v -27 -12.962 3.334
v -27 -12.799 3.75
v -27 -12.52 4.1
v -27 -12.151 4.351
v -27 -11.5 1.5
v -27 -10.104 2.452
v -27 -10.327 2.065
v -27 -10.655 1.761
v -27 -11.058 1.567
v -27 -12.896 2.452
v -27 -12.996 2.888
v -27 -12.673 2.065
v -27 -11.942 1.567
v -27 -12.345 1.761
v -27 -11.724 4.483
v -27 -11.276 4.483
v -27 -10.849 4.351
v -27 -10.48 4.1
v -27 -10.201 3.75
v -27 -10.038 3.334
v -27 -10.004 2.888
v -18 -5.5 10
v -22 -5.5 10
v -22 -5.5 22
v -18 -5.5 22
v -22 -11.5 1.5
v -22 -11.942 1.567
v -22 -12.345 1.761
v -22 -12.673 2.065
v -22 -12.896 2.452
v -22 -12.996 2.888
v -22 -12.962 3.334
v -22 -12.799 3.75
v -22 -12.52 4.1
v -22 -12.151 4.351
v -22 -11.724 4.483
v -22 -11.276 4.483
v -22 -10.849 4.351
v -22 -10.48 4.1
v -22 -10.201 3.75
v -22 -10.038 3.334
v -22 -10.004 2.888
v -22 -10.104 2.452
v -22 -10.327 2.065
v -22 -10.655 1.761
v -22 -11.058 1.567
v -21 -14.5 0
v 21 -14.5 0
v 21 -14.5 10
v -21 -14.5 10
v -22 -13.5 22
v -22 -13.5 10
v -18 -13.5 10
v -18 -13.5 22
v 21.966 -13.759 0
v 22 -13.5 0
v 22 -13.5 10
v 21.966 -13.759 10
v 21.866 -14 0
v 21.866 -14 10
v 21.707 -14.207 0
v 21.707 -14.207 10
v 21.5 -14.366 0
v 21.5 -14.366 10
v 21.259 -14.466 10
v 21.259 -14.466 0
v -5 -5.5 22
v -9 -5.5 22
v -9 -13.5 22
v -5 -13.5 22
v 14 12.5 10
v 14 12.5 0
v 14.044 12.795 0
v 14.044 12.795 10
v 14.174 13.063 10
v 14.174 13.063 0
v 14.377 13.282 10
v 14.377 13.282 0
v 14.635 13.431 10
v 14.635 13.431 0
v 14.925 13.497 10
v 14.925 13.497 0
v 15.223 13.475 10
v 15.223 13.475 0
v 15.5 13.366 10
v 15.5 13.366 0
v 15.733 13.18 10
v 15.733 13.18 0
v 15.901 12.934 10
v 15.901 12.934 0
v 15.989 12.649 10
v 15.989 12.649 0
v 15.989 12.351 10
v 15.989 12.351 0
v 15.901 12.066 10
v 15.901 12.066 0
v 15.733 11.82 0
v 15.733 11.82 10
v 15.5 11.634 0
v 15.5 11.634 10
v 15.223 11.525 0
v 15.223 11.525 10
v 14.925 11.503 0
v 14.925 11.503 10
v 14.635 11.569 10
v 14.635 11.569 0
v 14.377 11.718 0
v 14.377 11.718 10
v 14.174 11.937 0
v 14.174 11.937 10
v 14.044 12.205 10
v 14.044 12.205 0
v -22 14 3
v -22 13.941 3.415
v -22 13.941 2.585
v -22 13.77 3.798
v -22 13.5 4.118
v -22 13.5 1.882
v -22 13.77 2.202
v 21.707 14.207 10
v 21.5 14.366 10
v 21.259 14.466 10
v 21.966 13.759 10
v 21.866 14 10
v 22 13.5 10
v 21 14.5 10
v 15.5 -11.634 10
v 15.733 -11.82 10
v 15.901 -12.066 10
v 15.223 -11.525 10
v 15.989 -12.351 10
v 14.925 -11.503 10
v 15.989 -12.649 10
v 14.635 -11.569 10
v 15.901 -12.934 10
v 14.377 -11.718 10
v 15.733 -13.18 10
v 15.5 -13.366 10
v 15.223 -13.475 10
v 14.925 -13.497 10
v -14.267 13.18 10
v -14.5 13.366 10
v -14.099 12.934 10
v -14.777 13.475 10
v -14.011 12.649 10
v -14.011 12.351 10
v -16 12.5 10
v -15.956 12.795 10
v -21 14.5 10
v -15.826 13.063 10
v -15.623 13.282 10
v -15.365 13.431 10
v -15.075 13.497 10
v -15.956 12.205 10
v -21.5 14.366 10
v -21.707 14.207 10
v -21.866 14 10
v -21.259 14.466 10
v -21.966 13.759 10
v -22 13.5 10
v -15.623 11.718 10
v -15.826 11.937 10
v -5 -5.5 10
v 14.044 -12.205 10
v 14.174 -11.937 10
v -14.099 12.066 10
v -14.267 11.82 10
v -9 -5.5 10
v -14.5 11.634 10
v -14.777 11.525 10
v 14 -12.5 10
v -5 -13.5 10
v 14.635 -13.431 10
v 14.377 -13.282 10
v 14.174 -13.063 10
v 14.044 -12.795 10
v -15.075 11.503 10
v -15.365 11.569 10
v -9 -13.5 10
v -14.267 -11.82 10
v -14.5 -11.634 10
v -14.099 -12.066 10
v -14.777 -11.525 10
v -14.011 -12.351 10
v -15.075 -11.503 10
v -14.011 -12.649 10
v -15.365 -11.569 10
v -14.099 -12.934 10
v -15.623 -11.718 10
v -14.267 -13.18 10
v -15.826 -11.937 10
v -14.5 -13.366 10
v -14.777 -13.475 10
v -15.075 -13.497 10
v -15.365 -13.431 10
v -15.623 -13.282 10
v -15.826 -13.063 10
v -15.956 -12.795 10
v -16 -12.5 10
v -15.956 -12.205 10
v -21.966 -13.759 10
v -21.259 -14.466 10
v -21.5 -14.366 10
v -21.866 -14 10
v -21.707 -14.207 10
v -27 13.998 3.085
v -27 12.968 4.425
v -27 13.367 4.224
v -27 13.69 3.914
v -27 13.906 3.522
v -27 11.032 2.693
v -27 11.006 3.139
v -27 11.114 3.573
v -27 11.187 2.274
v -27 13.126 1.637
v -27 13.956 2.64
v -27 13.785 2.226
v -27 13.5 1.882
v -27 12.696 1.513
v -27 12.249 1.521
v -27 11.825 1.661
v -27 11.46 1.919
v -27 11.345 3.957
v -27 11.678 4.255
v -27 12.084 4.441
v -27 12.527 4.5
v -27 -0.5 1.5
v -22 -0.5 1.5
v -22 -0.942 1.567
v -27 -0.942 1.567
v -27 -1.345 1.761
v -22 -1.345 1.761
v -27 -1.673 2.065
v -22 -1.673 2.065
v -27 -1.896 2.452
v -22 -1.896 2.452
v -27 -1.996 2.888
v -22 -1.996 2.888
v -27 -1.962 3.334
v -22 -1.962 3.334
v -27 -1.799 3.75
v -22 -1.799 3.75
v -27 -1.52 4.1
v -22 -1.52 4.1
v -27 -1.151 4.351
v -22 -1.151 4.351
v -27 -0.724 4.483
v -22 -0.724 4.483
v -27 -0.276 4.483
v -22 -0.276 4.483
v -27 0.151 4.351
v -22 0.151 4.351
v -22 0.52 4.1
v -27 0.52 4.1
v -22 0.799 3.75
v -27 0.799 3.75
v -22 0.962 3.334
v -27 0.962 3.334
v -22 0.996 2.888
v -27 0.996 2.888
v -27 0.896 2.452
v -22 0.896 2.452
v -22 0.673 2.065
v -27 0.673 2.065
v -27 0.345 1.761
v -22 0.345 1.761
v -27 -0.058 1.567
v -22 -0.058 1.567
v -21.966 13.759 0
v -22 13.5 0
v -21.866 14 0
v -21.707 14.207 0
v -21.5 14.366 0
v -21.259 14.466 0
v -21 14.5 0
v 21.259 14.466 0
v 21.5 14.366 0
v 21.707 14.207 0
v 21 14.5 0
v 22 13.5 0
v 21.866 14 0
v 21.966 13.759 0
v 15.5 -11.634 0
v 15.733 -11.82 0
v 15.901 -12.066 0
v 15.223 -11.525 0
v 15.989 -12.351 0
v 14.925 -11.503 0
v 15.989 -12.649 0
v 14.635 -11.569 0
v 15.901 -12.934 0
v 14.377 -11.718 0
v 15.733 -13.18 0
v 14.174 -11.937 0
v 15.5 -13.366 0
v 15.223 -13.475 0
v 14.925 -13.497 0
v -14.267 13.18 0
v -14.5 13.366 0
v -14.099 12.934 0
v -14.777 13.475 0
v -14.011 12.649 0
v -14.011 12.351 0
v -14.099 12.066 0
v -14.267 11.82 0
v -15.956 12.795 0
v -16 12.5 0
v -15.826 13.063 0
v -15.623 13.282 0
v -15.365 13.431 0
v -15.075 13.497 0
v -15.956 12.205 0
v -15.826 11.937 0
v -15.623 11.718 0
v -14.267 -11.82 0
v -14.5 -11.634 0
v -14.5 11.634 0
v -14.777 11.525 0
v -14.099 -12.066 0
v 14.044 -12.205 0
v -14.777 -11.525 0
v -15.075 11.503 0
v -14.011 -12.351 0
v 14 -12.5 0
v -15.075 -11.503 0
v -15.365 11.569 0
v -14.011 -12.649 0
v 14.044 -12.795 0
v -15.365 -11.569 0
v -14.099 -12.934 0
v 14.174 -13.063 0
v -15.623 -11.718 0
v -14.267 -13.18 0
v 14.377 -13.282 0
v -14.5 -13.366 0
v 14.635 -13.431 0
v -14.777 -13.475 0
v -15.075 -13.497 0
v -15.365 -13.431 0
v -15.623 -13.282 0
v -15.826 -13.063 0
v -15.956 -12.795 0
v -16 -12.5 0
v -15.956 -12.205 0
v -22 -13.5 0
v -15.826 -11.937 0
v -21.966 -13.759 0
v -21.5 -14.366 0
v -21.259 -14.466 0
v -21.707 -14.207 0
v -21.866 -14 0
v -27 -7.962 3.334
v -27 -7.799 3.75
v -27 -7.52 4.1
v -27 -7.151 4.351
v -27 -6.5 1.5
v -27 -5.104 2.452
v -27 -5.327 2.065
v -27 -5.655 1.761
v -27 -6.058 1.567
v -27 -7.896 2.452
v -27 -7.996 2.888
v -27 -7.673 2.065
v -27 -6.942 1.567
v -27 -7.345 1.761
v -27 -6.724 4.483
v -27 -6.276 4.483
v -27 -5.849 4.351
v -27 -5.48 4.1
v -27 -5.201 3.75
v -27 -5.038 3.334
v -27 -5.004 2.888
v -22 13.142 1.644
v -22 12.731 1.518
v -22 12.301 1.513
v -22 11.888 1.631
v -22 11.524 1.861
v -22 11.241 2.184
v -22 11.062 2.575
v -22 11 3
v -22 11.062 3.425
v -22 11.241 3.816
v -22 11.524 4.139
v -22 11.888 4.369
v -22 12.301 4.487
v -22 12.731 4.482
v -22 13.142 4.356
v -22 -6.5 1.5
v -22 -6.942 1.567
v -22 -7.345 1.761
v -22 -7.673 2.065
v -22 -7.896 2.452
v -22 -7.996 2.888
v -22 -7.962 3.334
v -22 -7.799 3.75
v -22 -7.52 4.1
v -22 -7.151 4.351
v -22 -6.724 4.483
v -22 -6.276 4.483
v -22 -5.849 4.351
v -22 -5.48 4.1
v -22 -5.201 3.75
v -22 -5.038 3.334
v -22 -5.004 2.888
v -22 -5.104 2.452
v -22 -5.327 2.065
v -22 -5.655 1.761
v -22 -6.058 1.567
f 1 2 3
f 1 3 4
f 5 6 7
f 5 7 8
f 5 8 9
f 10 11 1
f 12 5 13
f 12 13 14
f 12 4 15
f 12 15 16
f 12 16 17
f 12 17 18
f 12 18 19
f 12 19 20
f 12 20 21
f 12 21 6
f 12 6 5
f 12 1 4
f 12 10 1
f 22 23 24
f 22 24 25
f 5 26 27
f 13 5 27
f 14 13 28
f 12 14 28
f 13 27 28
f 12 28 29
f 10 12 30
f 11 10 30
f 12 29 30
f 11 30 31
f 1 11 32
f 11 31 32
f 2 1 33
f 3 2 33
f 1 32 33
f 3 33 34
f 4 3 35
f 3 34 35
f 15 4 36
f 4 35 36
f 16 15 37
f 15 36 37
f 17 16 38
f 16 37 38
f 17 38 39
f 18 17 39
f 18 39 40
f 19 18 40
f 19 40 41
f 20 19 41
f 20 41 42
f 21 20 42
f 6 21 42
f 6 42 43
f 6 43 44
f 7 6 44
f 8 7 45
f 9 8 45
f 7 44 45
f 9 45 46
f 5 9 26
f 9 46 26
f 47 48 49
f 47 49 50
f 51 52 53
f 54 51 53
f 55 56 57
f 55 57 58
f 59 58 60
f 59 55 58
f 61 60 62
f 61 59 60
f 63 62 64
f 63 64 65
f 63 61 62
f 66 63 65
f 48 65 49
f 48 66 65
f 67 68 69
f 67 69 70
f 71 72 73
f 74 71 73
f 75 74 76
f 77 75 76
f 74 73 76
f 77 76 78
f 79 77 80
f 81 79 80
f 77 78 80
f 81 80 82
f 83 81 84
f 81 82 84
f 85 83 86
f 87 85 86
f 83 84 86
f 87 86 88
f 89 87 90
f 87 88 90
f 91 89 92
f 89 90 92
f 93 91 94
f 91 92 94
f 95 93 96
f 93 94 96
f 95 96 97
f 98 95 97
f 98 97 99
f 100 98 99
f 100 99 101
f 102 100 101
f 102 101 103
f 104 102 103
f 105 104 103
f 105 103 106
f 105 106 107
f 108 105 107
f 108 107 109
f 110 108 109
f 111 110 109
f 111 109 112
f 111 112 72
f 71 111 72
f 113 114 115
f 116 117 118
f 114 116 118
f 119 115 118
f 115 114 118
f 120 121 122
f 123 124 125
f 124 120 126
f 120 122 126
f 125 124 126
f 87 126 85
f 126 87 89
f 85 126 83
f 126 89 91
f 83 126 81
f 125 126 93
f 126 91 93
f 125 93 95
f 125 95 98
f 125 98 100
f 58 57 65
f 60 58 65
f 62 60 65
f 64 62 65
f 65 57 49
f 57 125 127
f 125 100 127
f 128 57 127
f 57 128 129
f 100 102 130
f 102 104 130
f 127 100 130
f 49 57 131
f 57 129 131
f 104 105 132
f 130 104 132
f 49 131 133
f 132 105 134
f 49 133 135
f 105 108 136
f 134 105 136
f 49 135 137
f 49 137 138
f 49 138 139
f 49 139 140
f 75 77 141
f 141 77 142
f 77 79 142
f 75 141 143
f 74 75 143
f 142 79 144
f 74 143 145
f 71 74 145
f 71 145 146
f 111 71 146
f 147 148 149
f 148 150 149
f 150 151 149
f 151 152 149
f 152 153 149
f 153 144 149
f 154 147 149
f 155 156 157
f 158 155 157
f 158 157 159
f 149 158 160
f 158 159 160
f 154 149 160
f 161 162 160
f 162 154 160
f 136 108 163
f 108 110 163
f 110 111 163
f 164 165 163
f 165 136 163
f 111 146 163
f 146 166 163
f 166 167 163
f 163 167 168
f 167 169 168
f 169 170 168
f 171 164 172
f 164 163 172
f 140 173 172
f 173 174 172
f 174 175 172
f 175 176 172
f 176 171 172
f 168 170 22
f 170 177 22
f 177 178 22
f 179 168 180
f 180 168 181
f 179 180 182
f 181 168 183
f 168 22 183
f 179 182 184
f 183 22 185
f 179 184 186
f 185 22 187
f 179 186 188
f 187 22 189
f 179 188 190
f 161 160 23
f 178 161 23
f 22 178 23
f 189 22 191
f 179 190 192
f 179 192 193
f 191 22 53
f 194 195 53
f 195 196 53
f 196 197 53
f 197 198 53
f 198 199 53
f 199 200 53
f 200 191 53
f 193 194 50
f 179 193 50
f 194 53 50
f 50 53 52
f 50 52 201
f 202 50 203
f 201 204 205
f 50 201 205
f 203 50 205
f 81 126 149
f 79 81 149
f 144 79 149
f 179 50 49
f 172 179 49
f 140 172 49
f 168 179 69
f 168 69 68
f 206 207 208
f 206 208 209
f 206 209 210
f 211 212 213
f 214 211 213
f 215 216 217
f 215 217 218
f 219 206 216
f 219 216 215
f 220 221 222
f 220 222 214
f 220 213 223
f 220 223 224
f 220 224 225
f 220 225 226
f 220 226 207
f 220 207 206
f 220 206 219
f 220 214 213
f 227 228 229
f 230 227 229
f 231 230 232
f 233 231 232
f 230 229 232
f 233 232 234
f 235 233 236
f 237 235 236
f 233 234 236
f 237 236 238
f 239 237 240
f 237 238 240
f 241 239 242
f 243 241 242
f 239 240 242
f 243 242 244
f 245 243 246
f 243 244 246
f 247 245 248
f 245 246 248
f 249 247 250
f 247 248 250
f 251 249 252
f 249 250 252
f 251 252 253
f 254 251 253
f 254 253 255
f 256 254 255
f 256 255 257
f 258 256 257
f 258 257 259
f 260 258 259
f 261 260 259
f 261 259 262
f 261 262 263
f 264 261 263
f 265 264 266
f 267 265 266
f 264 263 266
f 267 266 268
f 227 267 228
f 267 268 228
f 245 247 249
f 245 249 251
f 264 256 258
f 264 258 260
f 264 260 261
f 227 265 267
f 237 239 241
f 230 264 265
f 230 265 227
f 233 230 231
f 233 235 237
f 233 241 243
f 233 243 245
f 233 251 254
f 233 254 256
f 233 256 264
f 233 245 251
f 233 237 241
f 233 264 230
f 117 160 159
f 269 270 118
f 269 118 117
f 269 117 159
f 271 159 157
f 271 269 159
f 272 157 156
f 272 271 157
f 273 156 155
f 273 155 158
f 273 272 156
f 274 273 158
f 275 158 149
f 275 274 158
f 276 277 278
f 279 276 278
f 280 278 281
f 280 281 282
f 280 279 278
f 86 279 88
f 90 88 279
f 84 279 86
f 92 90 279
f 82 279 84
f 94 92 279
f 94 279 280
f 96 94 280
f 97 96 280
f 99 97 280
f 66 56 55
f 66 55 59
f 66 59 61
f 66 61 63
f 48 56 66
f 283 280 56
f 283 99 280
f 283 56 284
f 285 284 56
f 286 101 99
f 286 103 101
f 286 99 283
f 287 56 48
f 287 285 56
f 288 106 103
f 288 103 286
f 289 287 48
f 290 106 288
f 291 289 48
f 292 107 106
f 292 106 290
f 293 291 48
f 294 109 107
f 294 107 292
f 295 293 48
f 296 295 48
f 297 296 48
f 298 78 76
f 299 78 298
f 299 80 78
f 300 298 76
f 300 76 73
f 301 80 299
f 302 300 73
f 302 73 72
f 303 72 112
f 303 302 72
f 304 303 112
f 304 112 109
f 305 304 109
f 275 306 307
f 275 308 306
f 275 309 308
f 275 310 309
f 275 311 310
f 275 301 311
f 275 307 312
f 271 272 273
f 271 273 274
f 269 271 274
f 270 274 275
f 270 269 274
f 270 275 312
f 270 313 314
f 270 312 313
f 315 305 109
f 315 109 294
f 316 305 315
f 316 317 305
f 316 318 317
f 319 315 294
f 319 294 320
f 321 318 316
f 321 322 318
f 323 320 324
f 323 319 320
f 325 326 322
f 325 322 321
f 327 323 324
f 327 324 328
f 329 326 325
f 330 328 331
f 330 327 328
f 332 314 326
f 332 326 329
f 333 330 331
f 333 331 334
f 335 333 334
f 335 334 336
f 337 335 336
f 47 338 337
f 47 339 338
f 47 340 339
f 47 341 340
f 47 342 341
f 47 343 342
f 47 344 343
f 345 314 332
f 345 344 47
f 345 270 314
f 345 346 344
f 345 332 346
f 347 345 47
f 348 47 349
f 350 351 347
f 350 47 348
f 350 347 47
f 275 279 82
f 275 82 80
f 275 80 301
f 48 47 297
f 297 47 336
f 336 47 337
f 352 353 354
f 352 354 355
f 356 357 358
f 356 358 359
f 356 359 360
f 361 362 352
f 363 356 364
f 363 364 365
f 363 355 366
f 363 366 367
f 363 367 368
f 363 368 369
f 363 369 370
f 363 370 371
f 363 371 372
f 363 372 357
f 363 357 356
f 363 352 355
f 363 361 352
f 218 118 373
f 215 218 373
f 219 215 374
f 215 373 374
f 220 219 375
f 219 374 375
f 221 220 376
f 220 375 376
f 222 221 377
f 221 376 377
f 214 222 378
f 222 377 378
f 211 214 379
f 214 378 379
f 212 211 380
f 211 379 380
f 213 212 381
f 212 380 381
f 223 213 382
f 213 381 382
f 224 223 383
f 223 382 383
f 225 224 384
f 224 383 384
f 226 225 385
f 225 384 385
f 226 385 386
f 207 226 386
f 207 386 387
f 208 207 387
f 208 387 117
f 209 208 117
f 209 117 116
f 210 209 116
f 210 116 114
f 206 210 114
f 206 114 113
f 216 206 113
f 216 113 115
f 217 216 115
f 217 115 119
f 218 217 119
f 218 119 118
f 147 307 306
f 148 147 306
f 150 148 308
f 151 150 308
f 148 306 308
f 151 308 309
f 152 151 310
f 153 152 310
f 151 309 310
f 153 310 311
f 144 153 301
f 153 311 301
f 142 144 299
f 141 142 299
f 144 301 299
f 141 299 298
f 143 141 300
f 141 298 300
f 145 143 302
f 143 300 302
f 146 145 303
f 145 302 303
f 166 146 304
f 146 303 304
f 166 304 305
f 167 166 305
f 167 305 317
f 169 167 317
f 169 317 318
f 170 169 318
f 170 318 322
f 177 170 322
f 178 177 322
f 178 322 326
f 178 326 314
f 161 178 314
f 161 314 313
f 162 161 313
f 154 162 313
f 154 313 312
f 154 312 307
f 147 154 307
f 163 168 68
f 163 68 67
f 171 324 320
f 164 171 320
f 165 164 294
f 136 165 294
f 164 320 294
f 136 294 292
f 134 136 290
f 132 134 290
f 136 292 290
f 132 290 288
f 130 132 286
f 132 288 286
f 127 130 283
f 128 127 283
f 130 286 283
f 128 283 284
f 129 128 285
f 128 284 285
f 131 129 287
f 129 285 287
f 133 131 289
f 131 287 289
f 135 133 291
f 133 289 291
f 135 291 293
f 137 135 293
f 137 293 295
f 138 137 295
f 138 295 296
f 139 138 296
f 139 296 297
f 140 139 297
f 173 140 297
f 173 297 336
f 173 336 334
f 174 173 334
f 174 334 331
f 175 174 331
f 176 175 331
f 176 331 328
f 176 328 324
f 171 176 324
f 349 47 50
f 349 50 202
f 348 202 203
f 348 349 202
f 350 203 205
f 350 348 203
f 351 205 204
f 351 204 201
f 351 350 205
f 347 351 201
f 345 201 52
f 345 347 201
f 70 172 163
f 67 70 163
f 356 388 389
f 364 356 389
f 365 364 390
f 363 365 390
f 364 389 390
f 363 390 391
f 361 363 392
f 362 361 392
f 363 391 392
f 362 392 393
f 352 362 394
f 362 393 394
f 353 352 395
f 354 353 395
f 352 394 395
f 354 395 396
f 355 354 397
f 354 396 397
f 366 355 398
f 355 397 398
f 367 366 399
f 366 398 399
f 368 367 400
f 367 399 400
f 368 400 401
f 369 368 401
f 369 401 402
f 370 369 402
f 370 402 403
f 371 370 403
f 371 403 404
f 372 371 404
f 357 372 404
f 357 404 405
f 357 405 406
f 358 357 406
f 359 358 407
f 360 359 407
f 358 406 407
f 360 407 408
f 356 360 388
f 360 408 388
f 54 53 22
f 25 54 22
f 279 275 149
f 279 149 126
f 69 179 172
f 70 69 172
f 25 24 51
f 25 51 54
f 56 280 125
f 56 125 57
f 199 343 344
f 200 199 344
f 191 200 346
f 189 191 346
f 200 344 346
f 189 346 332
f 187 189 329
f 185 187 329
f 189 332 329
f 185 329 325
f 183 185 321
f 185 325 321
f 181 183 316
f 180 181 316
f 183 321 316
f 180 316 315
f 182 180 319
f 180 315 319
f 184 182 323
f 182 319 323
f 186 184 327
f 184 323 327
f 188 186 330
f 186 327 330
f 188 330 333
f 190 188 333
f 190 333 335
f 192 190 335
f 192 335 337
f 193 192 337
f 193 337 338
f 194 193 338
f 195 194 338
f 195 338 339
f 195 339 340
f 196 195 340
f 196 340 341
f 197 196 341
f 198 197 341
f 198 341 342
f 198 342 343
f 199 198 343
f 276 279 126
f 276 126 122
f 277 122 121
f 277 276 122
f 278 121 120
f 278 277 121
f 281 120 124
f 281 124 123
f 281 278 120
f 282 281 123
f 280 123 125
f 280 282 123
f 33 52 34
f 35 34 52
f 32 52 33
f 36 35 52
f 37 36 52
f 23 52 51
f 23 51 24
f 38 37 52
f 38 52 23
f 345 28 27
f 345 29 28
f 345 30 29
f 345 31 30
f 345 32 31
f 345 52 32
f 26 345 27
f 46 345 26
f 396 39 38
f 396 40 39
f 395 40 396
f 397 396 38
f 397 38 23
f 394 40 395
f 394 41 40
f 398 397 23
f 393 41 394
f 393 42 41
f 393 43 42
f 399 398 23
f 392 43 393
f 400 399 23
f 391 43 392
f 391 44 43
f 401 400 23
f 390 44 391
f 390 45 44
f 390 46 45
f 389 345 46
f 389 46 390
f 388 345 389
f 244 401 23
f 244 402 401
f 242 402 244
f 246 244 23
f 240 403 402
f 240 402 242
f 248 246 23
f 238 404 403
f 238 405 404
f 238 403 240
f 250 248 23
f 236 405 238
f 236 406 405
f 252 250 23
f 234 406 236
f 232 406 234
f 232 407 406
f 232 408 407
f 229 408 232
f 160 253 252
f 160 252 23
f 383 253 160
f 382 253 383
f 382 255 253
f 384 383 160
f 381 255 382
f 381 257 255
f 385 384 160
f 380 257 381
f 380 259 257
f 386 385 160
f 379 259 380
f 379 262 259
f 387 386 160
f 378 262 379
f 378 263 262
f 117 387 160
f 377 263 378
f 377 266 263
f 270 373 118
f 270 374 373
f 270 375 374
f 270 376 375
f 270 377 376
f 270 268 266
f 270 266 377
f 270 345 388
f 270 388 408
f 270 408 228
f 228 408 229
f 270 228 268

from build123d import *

# Parameters (mm, degrees)
BOSS_EXTRUDE1_DEPTH = 10
SKETCH2_R           = 1.5
BOSS_EXTRUDE2_DEPTH = 5
SKETCH3_W           = 4
SKETCH3_H           = 8
BOSS_EXTRUDE3_DEPTH = 12
SKETCH4_R           = 1
CUT_EXTRUDE1_DEPTH  = 38.725985739


with BuildPart() as part:
    # Sketch1 → Boss-Extrude1 (new body)
    with BuildSketch(Plane(origin=(0, 0, 0), x_dir=(0, 1, 0), z_dir=(0, 0, 1))):
        with BuildLine():
            Line((-13.5, 22), (13.5, 22))
            ThreePointArc((13.5, 22), (14.207106781, 21.707106781), (14.5, 21))
            Line((14.5, 21), (14.5, -21))
            ThreePointArc((14.5, -21), (14.207106781, -21.707106781), (13.5, -22))
            Line((13.5, -22), (-13.5, -22))
            ThreePointArc((-13.5, -22), (-14.207106781, -21.707106781), (-14.5, -21))
            Line((-14.5, -21), (-14.5, 21))
            ThreePointArc((-14.5, 21), (-14.207106781, 21.707106781), (-13.5, 22))
        make_face()
    extrude(amount=BOSS_EXTRUDE1_DEPTH)

    # Sketch2 → Boss-Extrude2 (add)
    with BuildSketch(Plane(origin=(-22, 0, 0), x_dir=(0, -1, 0), z_dir=(-1, 0, 0))):
        with Locations(Location((-12.5, 3, 0), (0, 0, 228.189685104))):
            Circle(SKETCH2_R)
        with Locations(Location((0.5, 3, 0), (0, 0, 270))):
            Circle(SKETCH2_R)
        with Locations(Location((6.5, 3, 0), (0, 0, 270))):
            Circle(SKETCH2_R)
        with Locations(Location((11.5, 3, 0), (0, 0, 270))):
            Circle(SKETCH2_R)
    extrude(amount=BOSS_EXTRUDE2_DEPTH)

    # Sketch3 → Boss-Extrude3 (add)
    with BuildSketch(Plane.XY.offset(10)):
        with Locations((-7, -9.5)):
            Rectangle(SKETCH3_W, SKETCH3_H)
        with Locations((-20, -9.5)):
            Rectangle(SKETCH3_W, SKETCH3_H)
    extrude(amount=BOSS_EXTRUDE3_DEPTH)

    # Sketch4 → Cut-Extrude1 (cut, through all)
    with BuildSketch(Plane(origin=(0, 0, 0), x_dir=(1, 0, 0), z_dir=(0, 0, -1))):
        with Locations(Location((-15, 12.5, 0), (0, 0, 180))):
            Circle(SKETCH4_R)
        with Locations(Location((15, 12.5, 0), (0, 0, 180))):
            Circle(SKETCH4_R)
        with Locations(Location((15, -12.5, 0), (0, 0, 180))):
            Circle(SKETCH4_R)
        with Locations(Location((-15, -12.5, 0), (0, 0, 180))):
            Circle(SKETCH4_R)
    extrude(amount=-CUT_EXTRUDE1_DEPTH, mode=Mode.SUBTRACT)


solid = part.part
